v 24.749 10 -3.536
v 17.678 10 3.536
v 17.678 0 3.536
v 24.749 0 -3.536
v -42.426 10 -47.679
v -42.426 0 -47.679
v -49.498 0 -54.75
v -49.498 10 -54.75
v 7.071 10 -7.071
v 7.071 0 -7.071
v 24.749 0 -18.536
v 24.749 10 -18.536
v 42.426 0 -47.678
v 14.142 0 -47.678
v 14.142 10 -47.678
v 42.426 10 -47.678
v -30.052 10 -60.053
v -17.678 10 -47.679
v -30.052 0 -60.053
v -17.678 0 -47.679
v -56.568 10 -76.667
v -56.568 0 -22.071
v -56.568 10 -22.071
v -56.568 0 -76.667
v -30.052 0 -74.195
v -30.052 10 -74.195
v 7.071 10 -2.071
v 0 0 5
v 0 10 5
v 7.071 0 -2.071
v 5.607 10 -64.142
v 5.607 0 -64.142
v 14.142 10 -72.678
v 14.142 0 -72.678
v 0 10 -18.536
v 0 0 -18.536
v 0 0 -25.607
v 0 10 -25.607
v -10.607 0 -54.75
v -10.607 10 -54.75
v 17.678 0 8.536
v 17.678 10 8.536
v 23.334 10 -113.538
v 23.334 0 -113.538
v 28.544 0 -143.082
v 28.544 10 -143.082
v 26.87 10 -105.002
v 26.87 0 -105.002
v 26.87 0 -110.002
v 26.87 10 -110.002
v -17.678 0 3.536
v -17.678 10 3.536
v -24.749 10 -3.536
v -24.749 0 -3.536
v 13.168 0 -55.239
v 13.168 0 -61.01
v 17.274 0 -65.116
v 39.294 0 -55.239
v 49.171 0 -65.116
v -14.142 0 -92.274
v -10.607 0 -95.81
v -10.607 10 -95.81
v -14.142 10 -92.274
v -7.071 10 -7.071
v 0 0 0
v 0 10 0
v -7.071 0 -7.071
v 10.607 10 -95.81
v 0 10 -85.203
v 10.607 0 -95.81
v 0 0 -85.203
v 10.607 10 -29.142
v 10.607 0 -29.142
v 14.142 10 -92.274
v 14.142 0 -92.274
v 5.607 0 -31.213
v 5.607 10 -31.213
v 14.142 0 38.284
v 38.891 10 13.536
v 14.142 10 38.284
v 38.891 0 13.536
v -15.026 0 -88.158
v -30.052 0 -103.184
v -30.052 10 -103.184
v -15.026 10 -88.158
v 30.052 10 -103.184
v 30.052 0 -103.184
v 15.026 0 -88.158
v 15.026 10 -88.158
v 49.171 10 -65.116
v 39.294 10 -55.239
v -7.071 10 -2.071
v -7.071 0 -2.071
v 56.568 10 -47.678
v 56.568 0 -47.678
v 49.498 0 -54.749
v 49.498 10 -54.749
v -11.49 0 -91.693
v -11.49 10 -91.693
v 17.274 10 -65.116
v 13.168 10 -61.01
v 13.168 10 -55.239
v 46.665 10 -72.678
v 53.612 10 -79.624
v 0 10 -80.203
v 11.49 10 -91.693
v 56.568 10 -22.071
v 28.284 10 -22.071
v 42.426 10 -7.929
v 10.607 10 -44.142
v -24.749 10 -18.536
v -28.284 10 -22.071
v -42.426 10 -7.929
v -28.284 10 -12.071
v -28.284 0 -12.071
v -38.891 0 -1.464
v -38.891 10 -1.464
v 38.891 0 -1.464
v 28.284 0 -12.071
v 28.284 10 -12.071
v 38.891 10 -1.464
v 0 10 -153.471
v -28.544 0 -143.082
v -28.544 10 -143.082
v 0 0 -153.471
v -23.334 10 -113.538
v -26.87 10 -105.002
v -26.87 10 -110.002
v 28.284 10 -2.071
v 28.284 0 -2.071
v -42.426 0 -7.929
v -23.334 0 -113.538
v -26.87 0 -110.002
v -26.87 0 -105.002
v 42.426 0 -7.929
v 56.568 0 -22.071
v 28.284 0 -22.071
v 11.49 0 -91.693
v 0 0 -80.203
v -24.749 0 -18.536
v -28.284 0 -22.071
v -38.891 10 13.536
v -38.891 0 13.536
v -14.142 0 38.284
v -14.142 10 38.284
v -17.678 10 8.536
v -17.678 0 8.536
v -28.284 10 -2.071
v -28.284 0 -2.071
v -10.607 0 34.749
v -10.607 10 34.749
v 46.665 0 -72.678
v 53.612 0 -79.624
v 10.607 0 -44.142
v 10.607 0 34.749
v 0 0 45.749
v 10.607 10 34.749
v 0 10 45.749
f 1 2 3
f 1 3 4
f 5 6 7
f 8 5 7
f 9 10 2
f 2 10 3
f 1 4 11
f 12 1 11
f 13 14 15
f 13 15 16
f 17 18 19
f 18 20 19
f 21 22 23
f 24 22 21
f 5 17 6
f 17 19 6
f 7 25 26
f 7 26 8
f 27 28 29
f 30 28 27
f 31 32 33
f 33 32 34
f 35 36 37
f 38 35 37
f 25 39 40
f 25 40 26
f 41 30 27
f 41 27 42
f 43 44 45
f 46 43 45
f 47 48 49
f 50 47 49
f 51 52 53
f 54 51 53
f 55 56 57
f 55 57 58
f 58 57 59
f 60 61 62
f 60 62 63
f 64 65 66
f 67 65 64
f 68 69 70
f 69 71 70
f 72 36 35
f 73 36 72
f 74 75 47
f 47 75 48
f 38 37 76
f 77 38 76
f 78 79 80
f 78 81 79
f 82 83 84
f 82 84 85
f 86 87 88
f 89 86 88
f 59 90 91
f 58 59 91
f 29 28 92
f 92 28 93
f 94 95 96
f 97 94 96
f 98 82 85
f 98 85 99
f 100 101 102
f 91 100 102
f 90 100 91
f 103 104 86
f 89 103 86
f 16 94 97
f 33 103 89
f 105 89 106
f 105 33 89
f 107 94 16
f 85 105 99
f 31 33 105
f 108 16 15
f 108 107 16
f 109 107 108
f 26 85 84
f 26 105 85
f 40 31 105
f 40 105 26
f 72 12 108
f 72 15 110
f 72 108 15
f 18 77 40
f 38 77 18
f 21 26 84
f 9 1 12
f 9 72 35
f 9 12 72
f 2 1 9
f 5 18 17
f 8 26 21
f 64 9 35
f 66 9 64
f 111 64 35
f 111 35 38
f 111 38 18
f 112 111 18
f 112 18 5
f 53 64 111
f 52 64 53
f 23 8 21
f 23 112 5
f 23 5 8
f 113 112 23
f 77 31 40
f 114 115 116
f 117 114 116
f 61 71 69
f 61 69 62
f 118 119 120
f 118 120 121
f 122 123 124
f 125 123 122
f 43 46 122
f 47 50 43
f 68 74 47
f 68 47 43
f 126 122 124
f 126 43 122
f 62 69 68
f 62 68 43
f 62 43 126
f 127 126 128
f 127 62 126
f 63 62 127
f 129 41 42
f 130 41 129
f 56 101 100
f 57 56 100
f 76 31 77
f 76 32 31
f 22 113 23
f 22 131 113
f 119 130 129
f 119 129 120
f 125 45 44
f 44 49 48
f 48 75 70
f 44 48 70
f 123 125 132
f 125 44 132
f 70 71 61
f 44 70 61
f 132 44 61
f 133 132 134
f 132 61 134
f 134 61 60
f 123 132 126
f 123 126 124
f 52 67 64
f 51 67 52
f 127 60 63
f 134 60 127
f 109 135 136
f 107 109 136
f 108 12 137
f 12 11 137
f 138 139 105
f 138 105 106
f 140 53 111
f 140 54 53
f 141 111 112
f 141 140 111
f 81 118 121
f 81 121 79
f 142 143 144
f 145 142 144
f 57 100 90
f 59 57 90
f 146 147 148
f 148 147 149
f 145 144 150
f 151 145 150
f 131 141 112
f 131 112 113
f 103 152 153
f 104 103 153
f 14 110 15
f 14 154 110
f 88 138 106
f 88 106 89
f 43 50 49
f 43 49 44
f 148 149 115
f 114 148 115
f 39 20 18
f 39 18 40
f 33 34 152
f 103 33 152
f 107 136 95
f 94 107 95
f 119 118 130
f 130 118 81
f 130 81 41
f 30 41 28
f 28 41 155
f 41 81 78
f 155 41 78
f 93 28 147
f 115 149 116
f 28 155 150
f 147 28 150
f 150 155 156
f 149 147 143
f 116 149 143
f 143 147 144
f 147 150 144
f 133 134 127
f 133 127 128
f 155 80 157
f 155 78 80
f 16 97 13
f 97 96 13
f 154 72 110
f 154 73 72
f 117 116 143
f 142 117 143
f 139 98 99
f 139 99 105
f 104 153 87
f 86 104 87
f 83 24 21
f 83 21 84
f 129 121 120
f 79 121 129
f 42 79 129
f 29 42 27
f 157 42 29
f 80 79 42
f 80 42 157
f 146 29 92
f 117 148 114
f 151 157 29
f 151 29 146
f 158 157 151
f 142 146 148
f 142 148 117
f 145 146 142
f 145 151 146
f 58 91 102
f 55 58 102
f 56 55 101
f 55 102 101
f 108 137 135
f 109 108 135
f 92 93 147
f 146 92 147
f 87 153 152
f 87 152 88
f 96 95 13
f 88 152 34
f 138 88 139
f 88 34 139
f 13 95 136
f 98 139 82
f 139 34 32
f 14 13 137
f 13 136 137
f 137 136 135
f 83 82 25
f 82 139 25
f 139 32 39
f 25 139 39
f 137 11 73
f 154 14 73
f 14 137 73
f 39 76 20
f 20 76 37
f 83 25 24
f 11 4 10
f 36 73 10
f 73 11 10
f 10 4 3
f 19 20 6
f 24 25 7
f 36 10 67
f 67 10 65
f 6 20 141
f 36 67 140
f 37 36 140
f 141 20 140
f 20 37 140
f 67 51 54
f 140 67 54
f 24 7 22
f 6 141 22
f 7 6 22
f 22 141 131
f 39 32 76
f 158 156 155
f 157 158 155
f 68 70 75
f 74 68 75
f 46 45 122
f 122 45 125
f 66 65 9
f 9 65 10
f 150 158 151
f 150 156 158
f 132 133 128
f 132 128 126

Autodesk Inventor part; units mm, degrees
ref_plane "YZ Plane" through (0, 0, 0) normal (1, 0, 0) x (0, 1, 0)
ref_plane "XZ Plane" through (0, 0, 0) normal (0, 1, 0) x (-1, 0, 0)
ref_plane "XY Plane" through (0, 0, 0) normal (0, 0, 1) x (1, 0, 0)
sketch "Sketch1" plane through (0, 0, 0) normal (0, 1, 0) x (-1, 0, 0)
  line L0 (0, 0) -> (-7.0711, -7.0711)
  line L1 (0, 0) -> (7.0711, -7.0711)
  line L2 (0, 0) -> (-1, 0)
  line L3 (7.0711, -7.0711) -> (17.6777, 3.5355)
  line L4 (-7.0711, -7.0711) -> (-17.6777, 3.5355)
  line L5 (0, 0) -> (0, 5)
  line L6 (0, 5) -> (7.0711, -2.0711)
  line L7 (7.0711, -2.0711) -> (17.6777, 8.5355)
  line L8 (0, 5) -> (-7.0711, -2.0711)
  line L9 (-7.0711, -2.0711) -> (-17.6777, 8.5355)
  line L10 (17.6777, 3.5355) -> (24.7487, -3.5355)
  line L11 (-17.6777, 3.5355) -> (-24.7487, -3.5355)
  line L12 (17.6777, 8.5355) -> (28.2843, -2.0711)
  line L13 (-17.6777, 8.5355) -> (-28.2843, -2.0711)
  line L14 (24.7487, -3.5355) -> (24.7487, -18.5355)
  line L15 (-24.7487, -3.5355) -> (-24.7487, -18.5355)
  line L16 (28.2843, -2.0711) -> (28.2843, -12.0711)
  line L17 (-28.2843, -2.0711) -> (-28.2843, -12.0711)
  line L18 (28.2843, -12.0711) -> (38.8909, -1.4645)
  line L19 (-28.2843, -12.0711) -> (-38.8909, -1.4645)
  line L20 (38.8909, -1.4645) -> (38.8909, 13.5355)
  line L21 (38.8909, 13.5355) -> (17.6777, 34.7487)
  line L22 (-38.8909, -1.4645) -> (-38.8909, 13.5355)
  line L23 (-38.8909, 13.5355) -> (-17.6777, 34.7487)
  line L24 (-17.6777, 34.7487) -> (17.6777, 34.7487)
  line L25 (24.7487, -18.5355) -> (28.2843, -22.0711)
  line L26 (28.2843, -22.0711) -> (42.4264, -7.9289)
  line L27 (-24.7487, -18.5355) -> (-28.2843, -22.0711)
  line L28 (-28.2843, -22.0711) -> (-42.4264, -7.9289)
  line L29 (17.6777, 34.7487) -> (14.1421, 38.2843)
  line L30 (14.1421, 38.2843) -> (10.6066, 34.7487)
  line L31 (0, 34.7487) -> (0, 45.7487)
  line L32 (10.6066, 34.7487) -> (0, 34.7487)
  line L33 (5.3033, 34.7487) -> (0, 34.7487)
  line L34 (0, 45.7487) -> (10.6066, 34.7487)
  line L35 (-17.6777, 34.7487) -> (-14.1421, 38.2843)
  line L36 (-14.1421, 38.2843) -> (-10.6066, 34.7487)
  line L37 (0, 45.7487) -> (-10.6066, 34.7487)
  line L38 (-42.4264, -7.9289) -> (-56.5685, -22.0711)
  line L39 (42.4264, -7.9289) -> (56.5685, -22.0711)
  line L40 (0, 0) -> (0, -18.5355)
  line L41 (0, -18.5355) -> (-10.6066, -29.1421)
  line L42 (-10.6066, -29.1421) -> (-10.6066, -44.1421)
  line L43 (-10.6066, -44.1421) -> (-14.1421, -47.6777)
  line L44 (-56.5685, -22.0711) -> (-56.5685, -47.6777)
  line L45 (-14.1421, -47.6777) -> (-56.5685, -47.6777)
  line L46 (-56.5685, -47.6777) -> (-49.4975, -54.7487)
  line L47 (-49.4975, -54.7487) -> (-42.4264, -47.6777)
  line L48 (-56.5685, -47.6777) -> (-52.6777, -47.6777)
  line L49 (-47.6777, -47.6777) -> (-42.4264, -47.6777)
  line L50 (-10.6066, -36.8853) -> (-5.6066, -36.8853)
  line L51 (-6.1919, -24.7274) -> (-2.6564, -28.263)
  line L52 (-5.6066, -36.8853) -> (-5.6066, -31.2132)
  line L53 (-5.6066, -31.2132) -> (-2.6564, -28.263)
  line L54 (0, -18.5355) -> (0, -25.6066)
  line L55 (0, -25.6066) -> (-2.6564, -28.263)
  line L56 (-5.6066, -36.8853) -> (-5.6066, -44.1422)
  line L57 (-5.6066, -44.1422) -> (-5.6066, -64.1422)
  line L58 (-5.6066, -64.1422) -> (-14.1421, -72.6777)
  line L59 (-14.1421, -72.6777) -> (-46.6651, -72.6777)
  line L60 (-46.6651, -72.6777) -> (-53.6117, -79.6243)
  line L61 (56.5685, -22.0711) -> (56.5685, -47.6777)
  line L62 (42.4264, -7.9289) -> (42.4264, -47.6786)
  line L63 (17.6777, 3.5355) -> (17.6777, -47.6786)
  line L64 (17.6777, -47.6786) -> (10.6066, -54.7497)
  line L65 (42.4264, -47.6786) -> (49.4975, -54.7497)
  line L66 (17.6777, -47.6786) -> (30.052, -60.053)
  line L67 (30.052, -60.053) -> (42.4264, -47.6786)
  line L68 (10.6066, -54.7497) -> (30.052, -74.1951)
  line L69 (30.052, -74.1951) -> (49.4975, -54.7497)
  line L70 (56.5685, -47.6777) -> (56.5685, -76.6674)
  line L71 (0, -25.6066) -> (0, -125.6066)
  line L72 (56.5685, -76.6674) -> (30.052, -103.1839)
  line L73 (30.052, -103.1839) -> (30.052, -74.1951)
  line L74 (30.052, -103.1839) -> (0, -103.1839)
  line L75 (0, -103.1839) -> (-30.052, -103.1839)
  line L76 (-53.6117, -79.6243) -> (-30.052, -103.1839)
  line L77 (30.052, -103.1839) -> (0, -73.1319)
  line L78 (-30.052, -103.1839) -> (0, -73.1319)
  line L79 (0, -73.1319) -> (0, -88.1319)
  line L80 (15.026, -88.1579) -> (11.4905, -91.6934)
  line L81 (11.4905, -91.6934) -> (0, -80.2029)
  line L82 (0, -80.2029) -> (-11.4905, -91.6934)
  line L83 (-11.4905, -91.6934) -> (-15.026, -88.1579)
  line L84 (0, -80.2029) -> (0, -85.2029)
  line L85 (0, -85.2029) -> (10.6066, -95.8095)
  line L86 (0, -85.2029) -> (-10.6066, -95.8095)
  line L87 (-10.6066, -95.8095) -> (-14.1421, -92.274)
  line L88 (10.6066, -95.8095) -> (14.1421, -92.274)
  line L89 (14.1421, -92.274) -> (26.87, -105.002)
  line L90 (-14.1421, -92.274) -> (-26.87, -105.002)
  line L91 (-26.87, -105.002) -> (-26.87, -110.002)
  line L92 (26.87, -105.002) -> (26.87, -110.002)
  line L93 (-26.87, -105.002) -> (-30.052, -105.002)
  line L94 (26.87, -110.002) -> (23.3345, -113.5375)
  line L95 (-26.87, -110.002) -> (-23.3345, -113.5375)
  line L96 (23.3345, -113.5375) -> (-23.3345, -113.5375)
  line L97 (0, -113.5375) -> (23.3345, -113.5375)
  line L98 (0, -113.5375) -> (-23.3345, -113.5375)
  line L99 (23.3345, -113.5375) -> (28.5439, -143.0817)
  line L100 (28.5439, -143.0817) -> (-1.5262, -154.0264)
  line L101 (-23.3345, -113.5375) -> (-28.5439, -143.0817)
  line L102 (-28.5439, -143.0817) -> (1.5262, -154.0264)
  line L103 (1.5262, -154.0264) -> (-1.5262, -154.0264)
  point P0 (0, -153.4709)
  dimension "d0" = 10
  dimension "d1" = 90
  dimension "d2" = 45
  dimension "d3" = 1
  dimension "d4" = 15
  dimension "d5" = 90
  dimension "d6" = 10
  dimension "d7" = 15
  dimension "d8" = 90
  dimension "d9" = 5
  dimension "d10" = 10
  dimension "d11" = 45
  dimension "d12" = 15
  dimension "d13" = 10
  dimension "d14" = 45
  dimension "d15" = 15
  dimension "d16" = 90
  dimension "d17" = 10
  dimension "d18" = 90
  dimension "d19" = 10
  dimension "d20" = 90
  dimension "d21" = 15
  dimension "d22" = 90
  dimension "d23" = 15
  dimension "d24" = 90
  dimension "d25" = 15
  dimension "d26" = 15
  dimension "d27" = 10
  dimension "d28" = 15
  dimension "d29" = 45
  dimension "d30" = 15
  dimension "d31" = 45
  dimension "d32" = 10
  dimension "d33" = 15
  dimension "d34" = 135
  dimension "d35" = 30
  dimension "d36" = 30
  dimension "d37" = 135
  dimension "d38" = 5
  dimension "d39" = 135
  dimension "d40" = 90
  dimension "d41" = 20
  dimension "d42" = 5
  dimension "d43" = 20
  dimension "d44" = 135
  dimension "d45" = 5
  dimension "d46" = 11
  dimension "d47" = 5
  dimension "d48" = 45
  dimension "d49" = 5
  dimension "d50" = 90
  dimension "d51" = 20
  dimension "d52" = 20
  dimension "d53" = 90
  dimension "d54" = 15
  dimension "d55" = 15
  dimension "d56" = 5
  dimension "d57" = 135
  dimension "d58" = 18.5355
  dimension "d59" = 10
  dimension "d60" = 10
  dimension "d61" = 45
  dimension "d62" = 45
  dimension "d63" = 3.8909
extrude "Extrusion1" add sketch "Sketch1" along normal blind 10 contours L40 L41 L42 L43 L45 L44 L38 L28 L27 L15 L11 L4 L0 | L8 L9 L13 L17 L19 L22 L23 L24 L21 L20 L18 L16 L12 L7 L6 | L1 L3 L63 L64 L68 L73 L77 L71 L54 L40 | L10 L14 L25 L26 L62 L67 L66 L63 | L71 L78 L76 L60 L59 L58 L57 L56 L52 L53 L55 | L77 L80 L81 L71 | L71 L82 L83 L78 | L69 L65 L62 L39 L61 L70 L72 L73 | L85 L88 L89 L74 L71 | L71 L75 L90 L87 L86 | L89 L92 L94 L96 L71 L74 | L75 L71 L96 L95 L91 L90 | L47 L46 L45 | L24 L30 L29 | L35 L36 L24 | L96 L99 L100 L102 L101 | L24 L31 L34 | L37 L31 L24
sketch "Sketch2" plane through (0, 10, 0) normal (0, 1, 0) x (1, 0, 0)
  line L0 (14.1421, 47.6777) -> (10.6066, 44.1421) projected
  line L1 (10.6066, 44.1421) -> (10.6066, 29.1421) projected
  line L2 (10.6066, 29.1421) -> (0, 18.5355) projected
  line L3 (0, 18.5355) -> (0, 25.6066) projected
  line L4 (0, 25.6066) -> (5.6066, 31.2132) projected
  line L5 (5.6066, 31.2132) -> (5.6066, 64.1422) projected
  line L6 (5.6066, 64.1422) -> (14.1421, 72.6777) projected
  line L7 (14.1421, 72.6777) -> (46.6651, 72.6777) projected
  line L8 (46.6651, 72.6777) -> (53.6117, 79.6243) projected
  line L9 (53.6117, 79.6243) -> (30.052, 103.1839) projected
  line L10 (30.052, 103.1839) -> (15.026, 88.1579) projected
  line L11 (15.026, 88.1579) -> (11.4905, 91.6934) projected
  line L12 (11.4905, 91.6934) -> (0, 80.2029) projected
  line L13 (0, 80.2029) -> (-11.4905, 91.6934) projected
  line L14 (-11.4905, 91.6934) -> (-15.026, 88.1579) projected
  line L15 (-15.026, 88.1579) -> (-30.052, 103.1839) projected
  line L16 (-30.052, 103.1839) -> (-56.5685, 76.6674) projected
  line L17 (-56.5685, 76.6674) -> (-56.5685, 22.0711) projected
  line L18 (-56.5685, 22.0711) -> (-42.4264, 7.9289) projected
  line L19 (-42.4264, 7.9289) -> (-28.2843, 22.0711) projected
  line L20 (-28.2843, 22.0711) -> (-24.7487, 18.5355) projected
  line L21 (-24.7487, 18.5355) -> (-24.7487, 3.5355) projected
  line L22 (-24.7487, 3.5355) -> (-17.6777, -3.5355) projected
  line L23 (-17.6777, -3.5355) -> (-7.0711, 7.0711) projected
  line L24 (-7.0711, 7.0711) -> (0, 0) projected
  line L25 (0, 0) -> (7.0711, 7.0711) projected
  line L26 (7.0711, 7.0711) -> (17.6777, -3.5355) projected
  line L27 (17.6777, -3.5355) -> (24.7487, 3.5355) projected
  line L28 (24.7487, 3.5355) -> (24.7487, 18.5355) projected
  line L29 (24.7487, 18.5355) -> (28.2843, 22.0711) projected
  line L30 (28.2843, 22.0711) -> (42.4264, 7.9289) projected
  line L31 (42.4264, 7.9289) -> (56.5685, 22.0711) projected
  line L32 (56.5685, 22.0711) -> (56.5685, 47.6777) projected
  line L33 (56.5685, 47.6777) -> (49.4975, 54.7487) projected
  line L34 (49.4975, 54.7487) -> (42.4264, 47.6777) projected
  line L35 (42.4264, 47.6777) -> (14.1421, 47.6777) projected
  line L36 (-30.052, 60.053) -> (-42.4264, 47.6786) projected
  line L37 (-42.4264, 47.6786) -> (-49.4975, 54.7497) projected
  line L38 (-49.4975, 54.7497) -> (-30.052, 74.1951) projected
  line L39 (-30.052, 74.1951) -> (-10.6066, 54.7497) projected
  line L40 (-10.6066, 54.7497) -> (-17.6777, 47.6786) projected
  line L41 (-17.6777, 47.6786) -> (-30.052, 60.053) projected
  line L42 (13.1681, 55.2391) -> (13.1681, 61.0101)
  line L43 (13.1681, 61.0101) -> (17.2741, 65.1162)
  line L44 (17.2741, 65.1162) -> (49.7971, 65.1162)
  line L45 (49.7971, 65.1162) -> (64.3052, 79.6243)
  line L46 (64.3052, 79.6243) -> (30.052, 113.8774)
  line L47 (30.052, 113.8774) -> (15.026, 98.8514)
  line L48 (15.026, 98.8514) -> (11.4905, 102.3869)
  line L49 (11.4905, 102.3869) -> (0, 90.8965)
  line L50 (0, 90.8965) -> (-11.4905, 102.3869)
  line L51 (-11.4905, 102.3869) -> (-15.026, 98.8514)
  line L52 (-15.026, 98.8514) -> (-30.052, 113.8774)
  line L53 (-30.052, 113.8774) -> (-64.13, 79.7995)
  line L54 (-64.13, 79.7995) -> (-64.13, 18.939)
  line L55 (-64.13, 18.939) -> (-42.4264, -2.7646)
  line L56 (-42.4264, -2.7646) -> (-32.3102, 7.3516)
  line L57 (-32.3102, 7.3516) -> (-32.3102, 0.4035)
  line L58 (-32.3102, 0.4035) -> (-17.6777, -14.2291)
  line L59 (-17.6777, -14.2291) -> (-7.0711, -3.6225)
  line L60 (-7.0711, -3.6225) -> (0, -10.6935)
  line L61 (0, -10.6935) -> (7.0711, -3.6225)
  line L62 (7.0711, -3.6225) -> (17.6777, -14.2291)
  line L63 (17.6777, -14.2291) -> (32.3102, 0.4035)
  line L64 (32.3102, 0.4035) -> (32.3102, 7.3516)
  line L65 (32.3102, 7.3516) -> (42.4264, -2.7646)
  line L66 (42.4264, -2.7646) -> (64.13, 18.939)
  line L67 (64.13, 18.939) -> (64.13, 50.8097)
  line L68 (64.13, 50.8097) -> (49.4975, 65.4423)
  line L69 (49.4975, 65.4423) -> (39.2943, 55.2391)
  line L70 (39.2943, 55.2391) -> (13.1681, 55.2391)
  point P0 (49.1714, 65.1162)
extrude "Extrusion2" add sketch "Sketch2" against normal blind 10 contours L42 L43 L44 L69 L70
equation "\"d4\" = d7"
equation "\"d5\" = d1"
equation "\"d6\" = d0"
equation "\"d7\" = 1.5 * d0"
equation "\"d8\" = d1"
equation "\"d10\" = d0"
equation "\"d11\" = d2"
equation "\"d12\" = d7"
equation "\"d13\" = d0"
equation "\"d14\" = d2"
equation "\"d15\" = d7"
equation "\"d16\" = d1"
equation "\"d18\" = d1"
equation "\"d20\" = d1"
equation "\"d21\" = d7"
equation "\"d22\" = d1"
equation "\"d23\" = d7"
equation "\"d24\" = d1"
equation "\"d25\" = d7"
equation "\"d26\" = d7"
equation "\"d27\" = d0"
equation "\"d28\" = d7"
equation "\"d29\" = d2"
equation "\"d30\" = d7"
equation "\"d31\" = d2"
equation "\"d32\" = d0"
equation "\"d33\" = d7"
equation "\"d36\" = d35"
equation "\"d37\" = d34"
equation "\"d38\" = 0.5 * d0"
equation "\"d41\" = 2 * d0"
equation "\"d42\" = d38"
equation "\"d43\" = d41"
equation "\"d44\" = d39"
equation "\"d47\" = d45"
equation "\"d50\" = d1"
equation "\"d51\" = d43"
equation "\"d52\" = d43"
equation "\"d53\" = d1"
properties part number "New Logo"
